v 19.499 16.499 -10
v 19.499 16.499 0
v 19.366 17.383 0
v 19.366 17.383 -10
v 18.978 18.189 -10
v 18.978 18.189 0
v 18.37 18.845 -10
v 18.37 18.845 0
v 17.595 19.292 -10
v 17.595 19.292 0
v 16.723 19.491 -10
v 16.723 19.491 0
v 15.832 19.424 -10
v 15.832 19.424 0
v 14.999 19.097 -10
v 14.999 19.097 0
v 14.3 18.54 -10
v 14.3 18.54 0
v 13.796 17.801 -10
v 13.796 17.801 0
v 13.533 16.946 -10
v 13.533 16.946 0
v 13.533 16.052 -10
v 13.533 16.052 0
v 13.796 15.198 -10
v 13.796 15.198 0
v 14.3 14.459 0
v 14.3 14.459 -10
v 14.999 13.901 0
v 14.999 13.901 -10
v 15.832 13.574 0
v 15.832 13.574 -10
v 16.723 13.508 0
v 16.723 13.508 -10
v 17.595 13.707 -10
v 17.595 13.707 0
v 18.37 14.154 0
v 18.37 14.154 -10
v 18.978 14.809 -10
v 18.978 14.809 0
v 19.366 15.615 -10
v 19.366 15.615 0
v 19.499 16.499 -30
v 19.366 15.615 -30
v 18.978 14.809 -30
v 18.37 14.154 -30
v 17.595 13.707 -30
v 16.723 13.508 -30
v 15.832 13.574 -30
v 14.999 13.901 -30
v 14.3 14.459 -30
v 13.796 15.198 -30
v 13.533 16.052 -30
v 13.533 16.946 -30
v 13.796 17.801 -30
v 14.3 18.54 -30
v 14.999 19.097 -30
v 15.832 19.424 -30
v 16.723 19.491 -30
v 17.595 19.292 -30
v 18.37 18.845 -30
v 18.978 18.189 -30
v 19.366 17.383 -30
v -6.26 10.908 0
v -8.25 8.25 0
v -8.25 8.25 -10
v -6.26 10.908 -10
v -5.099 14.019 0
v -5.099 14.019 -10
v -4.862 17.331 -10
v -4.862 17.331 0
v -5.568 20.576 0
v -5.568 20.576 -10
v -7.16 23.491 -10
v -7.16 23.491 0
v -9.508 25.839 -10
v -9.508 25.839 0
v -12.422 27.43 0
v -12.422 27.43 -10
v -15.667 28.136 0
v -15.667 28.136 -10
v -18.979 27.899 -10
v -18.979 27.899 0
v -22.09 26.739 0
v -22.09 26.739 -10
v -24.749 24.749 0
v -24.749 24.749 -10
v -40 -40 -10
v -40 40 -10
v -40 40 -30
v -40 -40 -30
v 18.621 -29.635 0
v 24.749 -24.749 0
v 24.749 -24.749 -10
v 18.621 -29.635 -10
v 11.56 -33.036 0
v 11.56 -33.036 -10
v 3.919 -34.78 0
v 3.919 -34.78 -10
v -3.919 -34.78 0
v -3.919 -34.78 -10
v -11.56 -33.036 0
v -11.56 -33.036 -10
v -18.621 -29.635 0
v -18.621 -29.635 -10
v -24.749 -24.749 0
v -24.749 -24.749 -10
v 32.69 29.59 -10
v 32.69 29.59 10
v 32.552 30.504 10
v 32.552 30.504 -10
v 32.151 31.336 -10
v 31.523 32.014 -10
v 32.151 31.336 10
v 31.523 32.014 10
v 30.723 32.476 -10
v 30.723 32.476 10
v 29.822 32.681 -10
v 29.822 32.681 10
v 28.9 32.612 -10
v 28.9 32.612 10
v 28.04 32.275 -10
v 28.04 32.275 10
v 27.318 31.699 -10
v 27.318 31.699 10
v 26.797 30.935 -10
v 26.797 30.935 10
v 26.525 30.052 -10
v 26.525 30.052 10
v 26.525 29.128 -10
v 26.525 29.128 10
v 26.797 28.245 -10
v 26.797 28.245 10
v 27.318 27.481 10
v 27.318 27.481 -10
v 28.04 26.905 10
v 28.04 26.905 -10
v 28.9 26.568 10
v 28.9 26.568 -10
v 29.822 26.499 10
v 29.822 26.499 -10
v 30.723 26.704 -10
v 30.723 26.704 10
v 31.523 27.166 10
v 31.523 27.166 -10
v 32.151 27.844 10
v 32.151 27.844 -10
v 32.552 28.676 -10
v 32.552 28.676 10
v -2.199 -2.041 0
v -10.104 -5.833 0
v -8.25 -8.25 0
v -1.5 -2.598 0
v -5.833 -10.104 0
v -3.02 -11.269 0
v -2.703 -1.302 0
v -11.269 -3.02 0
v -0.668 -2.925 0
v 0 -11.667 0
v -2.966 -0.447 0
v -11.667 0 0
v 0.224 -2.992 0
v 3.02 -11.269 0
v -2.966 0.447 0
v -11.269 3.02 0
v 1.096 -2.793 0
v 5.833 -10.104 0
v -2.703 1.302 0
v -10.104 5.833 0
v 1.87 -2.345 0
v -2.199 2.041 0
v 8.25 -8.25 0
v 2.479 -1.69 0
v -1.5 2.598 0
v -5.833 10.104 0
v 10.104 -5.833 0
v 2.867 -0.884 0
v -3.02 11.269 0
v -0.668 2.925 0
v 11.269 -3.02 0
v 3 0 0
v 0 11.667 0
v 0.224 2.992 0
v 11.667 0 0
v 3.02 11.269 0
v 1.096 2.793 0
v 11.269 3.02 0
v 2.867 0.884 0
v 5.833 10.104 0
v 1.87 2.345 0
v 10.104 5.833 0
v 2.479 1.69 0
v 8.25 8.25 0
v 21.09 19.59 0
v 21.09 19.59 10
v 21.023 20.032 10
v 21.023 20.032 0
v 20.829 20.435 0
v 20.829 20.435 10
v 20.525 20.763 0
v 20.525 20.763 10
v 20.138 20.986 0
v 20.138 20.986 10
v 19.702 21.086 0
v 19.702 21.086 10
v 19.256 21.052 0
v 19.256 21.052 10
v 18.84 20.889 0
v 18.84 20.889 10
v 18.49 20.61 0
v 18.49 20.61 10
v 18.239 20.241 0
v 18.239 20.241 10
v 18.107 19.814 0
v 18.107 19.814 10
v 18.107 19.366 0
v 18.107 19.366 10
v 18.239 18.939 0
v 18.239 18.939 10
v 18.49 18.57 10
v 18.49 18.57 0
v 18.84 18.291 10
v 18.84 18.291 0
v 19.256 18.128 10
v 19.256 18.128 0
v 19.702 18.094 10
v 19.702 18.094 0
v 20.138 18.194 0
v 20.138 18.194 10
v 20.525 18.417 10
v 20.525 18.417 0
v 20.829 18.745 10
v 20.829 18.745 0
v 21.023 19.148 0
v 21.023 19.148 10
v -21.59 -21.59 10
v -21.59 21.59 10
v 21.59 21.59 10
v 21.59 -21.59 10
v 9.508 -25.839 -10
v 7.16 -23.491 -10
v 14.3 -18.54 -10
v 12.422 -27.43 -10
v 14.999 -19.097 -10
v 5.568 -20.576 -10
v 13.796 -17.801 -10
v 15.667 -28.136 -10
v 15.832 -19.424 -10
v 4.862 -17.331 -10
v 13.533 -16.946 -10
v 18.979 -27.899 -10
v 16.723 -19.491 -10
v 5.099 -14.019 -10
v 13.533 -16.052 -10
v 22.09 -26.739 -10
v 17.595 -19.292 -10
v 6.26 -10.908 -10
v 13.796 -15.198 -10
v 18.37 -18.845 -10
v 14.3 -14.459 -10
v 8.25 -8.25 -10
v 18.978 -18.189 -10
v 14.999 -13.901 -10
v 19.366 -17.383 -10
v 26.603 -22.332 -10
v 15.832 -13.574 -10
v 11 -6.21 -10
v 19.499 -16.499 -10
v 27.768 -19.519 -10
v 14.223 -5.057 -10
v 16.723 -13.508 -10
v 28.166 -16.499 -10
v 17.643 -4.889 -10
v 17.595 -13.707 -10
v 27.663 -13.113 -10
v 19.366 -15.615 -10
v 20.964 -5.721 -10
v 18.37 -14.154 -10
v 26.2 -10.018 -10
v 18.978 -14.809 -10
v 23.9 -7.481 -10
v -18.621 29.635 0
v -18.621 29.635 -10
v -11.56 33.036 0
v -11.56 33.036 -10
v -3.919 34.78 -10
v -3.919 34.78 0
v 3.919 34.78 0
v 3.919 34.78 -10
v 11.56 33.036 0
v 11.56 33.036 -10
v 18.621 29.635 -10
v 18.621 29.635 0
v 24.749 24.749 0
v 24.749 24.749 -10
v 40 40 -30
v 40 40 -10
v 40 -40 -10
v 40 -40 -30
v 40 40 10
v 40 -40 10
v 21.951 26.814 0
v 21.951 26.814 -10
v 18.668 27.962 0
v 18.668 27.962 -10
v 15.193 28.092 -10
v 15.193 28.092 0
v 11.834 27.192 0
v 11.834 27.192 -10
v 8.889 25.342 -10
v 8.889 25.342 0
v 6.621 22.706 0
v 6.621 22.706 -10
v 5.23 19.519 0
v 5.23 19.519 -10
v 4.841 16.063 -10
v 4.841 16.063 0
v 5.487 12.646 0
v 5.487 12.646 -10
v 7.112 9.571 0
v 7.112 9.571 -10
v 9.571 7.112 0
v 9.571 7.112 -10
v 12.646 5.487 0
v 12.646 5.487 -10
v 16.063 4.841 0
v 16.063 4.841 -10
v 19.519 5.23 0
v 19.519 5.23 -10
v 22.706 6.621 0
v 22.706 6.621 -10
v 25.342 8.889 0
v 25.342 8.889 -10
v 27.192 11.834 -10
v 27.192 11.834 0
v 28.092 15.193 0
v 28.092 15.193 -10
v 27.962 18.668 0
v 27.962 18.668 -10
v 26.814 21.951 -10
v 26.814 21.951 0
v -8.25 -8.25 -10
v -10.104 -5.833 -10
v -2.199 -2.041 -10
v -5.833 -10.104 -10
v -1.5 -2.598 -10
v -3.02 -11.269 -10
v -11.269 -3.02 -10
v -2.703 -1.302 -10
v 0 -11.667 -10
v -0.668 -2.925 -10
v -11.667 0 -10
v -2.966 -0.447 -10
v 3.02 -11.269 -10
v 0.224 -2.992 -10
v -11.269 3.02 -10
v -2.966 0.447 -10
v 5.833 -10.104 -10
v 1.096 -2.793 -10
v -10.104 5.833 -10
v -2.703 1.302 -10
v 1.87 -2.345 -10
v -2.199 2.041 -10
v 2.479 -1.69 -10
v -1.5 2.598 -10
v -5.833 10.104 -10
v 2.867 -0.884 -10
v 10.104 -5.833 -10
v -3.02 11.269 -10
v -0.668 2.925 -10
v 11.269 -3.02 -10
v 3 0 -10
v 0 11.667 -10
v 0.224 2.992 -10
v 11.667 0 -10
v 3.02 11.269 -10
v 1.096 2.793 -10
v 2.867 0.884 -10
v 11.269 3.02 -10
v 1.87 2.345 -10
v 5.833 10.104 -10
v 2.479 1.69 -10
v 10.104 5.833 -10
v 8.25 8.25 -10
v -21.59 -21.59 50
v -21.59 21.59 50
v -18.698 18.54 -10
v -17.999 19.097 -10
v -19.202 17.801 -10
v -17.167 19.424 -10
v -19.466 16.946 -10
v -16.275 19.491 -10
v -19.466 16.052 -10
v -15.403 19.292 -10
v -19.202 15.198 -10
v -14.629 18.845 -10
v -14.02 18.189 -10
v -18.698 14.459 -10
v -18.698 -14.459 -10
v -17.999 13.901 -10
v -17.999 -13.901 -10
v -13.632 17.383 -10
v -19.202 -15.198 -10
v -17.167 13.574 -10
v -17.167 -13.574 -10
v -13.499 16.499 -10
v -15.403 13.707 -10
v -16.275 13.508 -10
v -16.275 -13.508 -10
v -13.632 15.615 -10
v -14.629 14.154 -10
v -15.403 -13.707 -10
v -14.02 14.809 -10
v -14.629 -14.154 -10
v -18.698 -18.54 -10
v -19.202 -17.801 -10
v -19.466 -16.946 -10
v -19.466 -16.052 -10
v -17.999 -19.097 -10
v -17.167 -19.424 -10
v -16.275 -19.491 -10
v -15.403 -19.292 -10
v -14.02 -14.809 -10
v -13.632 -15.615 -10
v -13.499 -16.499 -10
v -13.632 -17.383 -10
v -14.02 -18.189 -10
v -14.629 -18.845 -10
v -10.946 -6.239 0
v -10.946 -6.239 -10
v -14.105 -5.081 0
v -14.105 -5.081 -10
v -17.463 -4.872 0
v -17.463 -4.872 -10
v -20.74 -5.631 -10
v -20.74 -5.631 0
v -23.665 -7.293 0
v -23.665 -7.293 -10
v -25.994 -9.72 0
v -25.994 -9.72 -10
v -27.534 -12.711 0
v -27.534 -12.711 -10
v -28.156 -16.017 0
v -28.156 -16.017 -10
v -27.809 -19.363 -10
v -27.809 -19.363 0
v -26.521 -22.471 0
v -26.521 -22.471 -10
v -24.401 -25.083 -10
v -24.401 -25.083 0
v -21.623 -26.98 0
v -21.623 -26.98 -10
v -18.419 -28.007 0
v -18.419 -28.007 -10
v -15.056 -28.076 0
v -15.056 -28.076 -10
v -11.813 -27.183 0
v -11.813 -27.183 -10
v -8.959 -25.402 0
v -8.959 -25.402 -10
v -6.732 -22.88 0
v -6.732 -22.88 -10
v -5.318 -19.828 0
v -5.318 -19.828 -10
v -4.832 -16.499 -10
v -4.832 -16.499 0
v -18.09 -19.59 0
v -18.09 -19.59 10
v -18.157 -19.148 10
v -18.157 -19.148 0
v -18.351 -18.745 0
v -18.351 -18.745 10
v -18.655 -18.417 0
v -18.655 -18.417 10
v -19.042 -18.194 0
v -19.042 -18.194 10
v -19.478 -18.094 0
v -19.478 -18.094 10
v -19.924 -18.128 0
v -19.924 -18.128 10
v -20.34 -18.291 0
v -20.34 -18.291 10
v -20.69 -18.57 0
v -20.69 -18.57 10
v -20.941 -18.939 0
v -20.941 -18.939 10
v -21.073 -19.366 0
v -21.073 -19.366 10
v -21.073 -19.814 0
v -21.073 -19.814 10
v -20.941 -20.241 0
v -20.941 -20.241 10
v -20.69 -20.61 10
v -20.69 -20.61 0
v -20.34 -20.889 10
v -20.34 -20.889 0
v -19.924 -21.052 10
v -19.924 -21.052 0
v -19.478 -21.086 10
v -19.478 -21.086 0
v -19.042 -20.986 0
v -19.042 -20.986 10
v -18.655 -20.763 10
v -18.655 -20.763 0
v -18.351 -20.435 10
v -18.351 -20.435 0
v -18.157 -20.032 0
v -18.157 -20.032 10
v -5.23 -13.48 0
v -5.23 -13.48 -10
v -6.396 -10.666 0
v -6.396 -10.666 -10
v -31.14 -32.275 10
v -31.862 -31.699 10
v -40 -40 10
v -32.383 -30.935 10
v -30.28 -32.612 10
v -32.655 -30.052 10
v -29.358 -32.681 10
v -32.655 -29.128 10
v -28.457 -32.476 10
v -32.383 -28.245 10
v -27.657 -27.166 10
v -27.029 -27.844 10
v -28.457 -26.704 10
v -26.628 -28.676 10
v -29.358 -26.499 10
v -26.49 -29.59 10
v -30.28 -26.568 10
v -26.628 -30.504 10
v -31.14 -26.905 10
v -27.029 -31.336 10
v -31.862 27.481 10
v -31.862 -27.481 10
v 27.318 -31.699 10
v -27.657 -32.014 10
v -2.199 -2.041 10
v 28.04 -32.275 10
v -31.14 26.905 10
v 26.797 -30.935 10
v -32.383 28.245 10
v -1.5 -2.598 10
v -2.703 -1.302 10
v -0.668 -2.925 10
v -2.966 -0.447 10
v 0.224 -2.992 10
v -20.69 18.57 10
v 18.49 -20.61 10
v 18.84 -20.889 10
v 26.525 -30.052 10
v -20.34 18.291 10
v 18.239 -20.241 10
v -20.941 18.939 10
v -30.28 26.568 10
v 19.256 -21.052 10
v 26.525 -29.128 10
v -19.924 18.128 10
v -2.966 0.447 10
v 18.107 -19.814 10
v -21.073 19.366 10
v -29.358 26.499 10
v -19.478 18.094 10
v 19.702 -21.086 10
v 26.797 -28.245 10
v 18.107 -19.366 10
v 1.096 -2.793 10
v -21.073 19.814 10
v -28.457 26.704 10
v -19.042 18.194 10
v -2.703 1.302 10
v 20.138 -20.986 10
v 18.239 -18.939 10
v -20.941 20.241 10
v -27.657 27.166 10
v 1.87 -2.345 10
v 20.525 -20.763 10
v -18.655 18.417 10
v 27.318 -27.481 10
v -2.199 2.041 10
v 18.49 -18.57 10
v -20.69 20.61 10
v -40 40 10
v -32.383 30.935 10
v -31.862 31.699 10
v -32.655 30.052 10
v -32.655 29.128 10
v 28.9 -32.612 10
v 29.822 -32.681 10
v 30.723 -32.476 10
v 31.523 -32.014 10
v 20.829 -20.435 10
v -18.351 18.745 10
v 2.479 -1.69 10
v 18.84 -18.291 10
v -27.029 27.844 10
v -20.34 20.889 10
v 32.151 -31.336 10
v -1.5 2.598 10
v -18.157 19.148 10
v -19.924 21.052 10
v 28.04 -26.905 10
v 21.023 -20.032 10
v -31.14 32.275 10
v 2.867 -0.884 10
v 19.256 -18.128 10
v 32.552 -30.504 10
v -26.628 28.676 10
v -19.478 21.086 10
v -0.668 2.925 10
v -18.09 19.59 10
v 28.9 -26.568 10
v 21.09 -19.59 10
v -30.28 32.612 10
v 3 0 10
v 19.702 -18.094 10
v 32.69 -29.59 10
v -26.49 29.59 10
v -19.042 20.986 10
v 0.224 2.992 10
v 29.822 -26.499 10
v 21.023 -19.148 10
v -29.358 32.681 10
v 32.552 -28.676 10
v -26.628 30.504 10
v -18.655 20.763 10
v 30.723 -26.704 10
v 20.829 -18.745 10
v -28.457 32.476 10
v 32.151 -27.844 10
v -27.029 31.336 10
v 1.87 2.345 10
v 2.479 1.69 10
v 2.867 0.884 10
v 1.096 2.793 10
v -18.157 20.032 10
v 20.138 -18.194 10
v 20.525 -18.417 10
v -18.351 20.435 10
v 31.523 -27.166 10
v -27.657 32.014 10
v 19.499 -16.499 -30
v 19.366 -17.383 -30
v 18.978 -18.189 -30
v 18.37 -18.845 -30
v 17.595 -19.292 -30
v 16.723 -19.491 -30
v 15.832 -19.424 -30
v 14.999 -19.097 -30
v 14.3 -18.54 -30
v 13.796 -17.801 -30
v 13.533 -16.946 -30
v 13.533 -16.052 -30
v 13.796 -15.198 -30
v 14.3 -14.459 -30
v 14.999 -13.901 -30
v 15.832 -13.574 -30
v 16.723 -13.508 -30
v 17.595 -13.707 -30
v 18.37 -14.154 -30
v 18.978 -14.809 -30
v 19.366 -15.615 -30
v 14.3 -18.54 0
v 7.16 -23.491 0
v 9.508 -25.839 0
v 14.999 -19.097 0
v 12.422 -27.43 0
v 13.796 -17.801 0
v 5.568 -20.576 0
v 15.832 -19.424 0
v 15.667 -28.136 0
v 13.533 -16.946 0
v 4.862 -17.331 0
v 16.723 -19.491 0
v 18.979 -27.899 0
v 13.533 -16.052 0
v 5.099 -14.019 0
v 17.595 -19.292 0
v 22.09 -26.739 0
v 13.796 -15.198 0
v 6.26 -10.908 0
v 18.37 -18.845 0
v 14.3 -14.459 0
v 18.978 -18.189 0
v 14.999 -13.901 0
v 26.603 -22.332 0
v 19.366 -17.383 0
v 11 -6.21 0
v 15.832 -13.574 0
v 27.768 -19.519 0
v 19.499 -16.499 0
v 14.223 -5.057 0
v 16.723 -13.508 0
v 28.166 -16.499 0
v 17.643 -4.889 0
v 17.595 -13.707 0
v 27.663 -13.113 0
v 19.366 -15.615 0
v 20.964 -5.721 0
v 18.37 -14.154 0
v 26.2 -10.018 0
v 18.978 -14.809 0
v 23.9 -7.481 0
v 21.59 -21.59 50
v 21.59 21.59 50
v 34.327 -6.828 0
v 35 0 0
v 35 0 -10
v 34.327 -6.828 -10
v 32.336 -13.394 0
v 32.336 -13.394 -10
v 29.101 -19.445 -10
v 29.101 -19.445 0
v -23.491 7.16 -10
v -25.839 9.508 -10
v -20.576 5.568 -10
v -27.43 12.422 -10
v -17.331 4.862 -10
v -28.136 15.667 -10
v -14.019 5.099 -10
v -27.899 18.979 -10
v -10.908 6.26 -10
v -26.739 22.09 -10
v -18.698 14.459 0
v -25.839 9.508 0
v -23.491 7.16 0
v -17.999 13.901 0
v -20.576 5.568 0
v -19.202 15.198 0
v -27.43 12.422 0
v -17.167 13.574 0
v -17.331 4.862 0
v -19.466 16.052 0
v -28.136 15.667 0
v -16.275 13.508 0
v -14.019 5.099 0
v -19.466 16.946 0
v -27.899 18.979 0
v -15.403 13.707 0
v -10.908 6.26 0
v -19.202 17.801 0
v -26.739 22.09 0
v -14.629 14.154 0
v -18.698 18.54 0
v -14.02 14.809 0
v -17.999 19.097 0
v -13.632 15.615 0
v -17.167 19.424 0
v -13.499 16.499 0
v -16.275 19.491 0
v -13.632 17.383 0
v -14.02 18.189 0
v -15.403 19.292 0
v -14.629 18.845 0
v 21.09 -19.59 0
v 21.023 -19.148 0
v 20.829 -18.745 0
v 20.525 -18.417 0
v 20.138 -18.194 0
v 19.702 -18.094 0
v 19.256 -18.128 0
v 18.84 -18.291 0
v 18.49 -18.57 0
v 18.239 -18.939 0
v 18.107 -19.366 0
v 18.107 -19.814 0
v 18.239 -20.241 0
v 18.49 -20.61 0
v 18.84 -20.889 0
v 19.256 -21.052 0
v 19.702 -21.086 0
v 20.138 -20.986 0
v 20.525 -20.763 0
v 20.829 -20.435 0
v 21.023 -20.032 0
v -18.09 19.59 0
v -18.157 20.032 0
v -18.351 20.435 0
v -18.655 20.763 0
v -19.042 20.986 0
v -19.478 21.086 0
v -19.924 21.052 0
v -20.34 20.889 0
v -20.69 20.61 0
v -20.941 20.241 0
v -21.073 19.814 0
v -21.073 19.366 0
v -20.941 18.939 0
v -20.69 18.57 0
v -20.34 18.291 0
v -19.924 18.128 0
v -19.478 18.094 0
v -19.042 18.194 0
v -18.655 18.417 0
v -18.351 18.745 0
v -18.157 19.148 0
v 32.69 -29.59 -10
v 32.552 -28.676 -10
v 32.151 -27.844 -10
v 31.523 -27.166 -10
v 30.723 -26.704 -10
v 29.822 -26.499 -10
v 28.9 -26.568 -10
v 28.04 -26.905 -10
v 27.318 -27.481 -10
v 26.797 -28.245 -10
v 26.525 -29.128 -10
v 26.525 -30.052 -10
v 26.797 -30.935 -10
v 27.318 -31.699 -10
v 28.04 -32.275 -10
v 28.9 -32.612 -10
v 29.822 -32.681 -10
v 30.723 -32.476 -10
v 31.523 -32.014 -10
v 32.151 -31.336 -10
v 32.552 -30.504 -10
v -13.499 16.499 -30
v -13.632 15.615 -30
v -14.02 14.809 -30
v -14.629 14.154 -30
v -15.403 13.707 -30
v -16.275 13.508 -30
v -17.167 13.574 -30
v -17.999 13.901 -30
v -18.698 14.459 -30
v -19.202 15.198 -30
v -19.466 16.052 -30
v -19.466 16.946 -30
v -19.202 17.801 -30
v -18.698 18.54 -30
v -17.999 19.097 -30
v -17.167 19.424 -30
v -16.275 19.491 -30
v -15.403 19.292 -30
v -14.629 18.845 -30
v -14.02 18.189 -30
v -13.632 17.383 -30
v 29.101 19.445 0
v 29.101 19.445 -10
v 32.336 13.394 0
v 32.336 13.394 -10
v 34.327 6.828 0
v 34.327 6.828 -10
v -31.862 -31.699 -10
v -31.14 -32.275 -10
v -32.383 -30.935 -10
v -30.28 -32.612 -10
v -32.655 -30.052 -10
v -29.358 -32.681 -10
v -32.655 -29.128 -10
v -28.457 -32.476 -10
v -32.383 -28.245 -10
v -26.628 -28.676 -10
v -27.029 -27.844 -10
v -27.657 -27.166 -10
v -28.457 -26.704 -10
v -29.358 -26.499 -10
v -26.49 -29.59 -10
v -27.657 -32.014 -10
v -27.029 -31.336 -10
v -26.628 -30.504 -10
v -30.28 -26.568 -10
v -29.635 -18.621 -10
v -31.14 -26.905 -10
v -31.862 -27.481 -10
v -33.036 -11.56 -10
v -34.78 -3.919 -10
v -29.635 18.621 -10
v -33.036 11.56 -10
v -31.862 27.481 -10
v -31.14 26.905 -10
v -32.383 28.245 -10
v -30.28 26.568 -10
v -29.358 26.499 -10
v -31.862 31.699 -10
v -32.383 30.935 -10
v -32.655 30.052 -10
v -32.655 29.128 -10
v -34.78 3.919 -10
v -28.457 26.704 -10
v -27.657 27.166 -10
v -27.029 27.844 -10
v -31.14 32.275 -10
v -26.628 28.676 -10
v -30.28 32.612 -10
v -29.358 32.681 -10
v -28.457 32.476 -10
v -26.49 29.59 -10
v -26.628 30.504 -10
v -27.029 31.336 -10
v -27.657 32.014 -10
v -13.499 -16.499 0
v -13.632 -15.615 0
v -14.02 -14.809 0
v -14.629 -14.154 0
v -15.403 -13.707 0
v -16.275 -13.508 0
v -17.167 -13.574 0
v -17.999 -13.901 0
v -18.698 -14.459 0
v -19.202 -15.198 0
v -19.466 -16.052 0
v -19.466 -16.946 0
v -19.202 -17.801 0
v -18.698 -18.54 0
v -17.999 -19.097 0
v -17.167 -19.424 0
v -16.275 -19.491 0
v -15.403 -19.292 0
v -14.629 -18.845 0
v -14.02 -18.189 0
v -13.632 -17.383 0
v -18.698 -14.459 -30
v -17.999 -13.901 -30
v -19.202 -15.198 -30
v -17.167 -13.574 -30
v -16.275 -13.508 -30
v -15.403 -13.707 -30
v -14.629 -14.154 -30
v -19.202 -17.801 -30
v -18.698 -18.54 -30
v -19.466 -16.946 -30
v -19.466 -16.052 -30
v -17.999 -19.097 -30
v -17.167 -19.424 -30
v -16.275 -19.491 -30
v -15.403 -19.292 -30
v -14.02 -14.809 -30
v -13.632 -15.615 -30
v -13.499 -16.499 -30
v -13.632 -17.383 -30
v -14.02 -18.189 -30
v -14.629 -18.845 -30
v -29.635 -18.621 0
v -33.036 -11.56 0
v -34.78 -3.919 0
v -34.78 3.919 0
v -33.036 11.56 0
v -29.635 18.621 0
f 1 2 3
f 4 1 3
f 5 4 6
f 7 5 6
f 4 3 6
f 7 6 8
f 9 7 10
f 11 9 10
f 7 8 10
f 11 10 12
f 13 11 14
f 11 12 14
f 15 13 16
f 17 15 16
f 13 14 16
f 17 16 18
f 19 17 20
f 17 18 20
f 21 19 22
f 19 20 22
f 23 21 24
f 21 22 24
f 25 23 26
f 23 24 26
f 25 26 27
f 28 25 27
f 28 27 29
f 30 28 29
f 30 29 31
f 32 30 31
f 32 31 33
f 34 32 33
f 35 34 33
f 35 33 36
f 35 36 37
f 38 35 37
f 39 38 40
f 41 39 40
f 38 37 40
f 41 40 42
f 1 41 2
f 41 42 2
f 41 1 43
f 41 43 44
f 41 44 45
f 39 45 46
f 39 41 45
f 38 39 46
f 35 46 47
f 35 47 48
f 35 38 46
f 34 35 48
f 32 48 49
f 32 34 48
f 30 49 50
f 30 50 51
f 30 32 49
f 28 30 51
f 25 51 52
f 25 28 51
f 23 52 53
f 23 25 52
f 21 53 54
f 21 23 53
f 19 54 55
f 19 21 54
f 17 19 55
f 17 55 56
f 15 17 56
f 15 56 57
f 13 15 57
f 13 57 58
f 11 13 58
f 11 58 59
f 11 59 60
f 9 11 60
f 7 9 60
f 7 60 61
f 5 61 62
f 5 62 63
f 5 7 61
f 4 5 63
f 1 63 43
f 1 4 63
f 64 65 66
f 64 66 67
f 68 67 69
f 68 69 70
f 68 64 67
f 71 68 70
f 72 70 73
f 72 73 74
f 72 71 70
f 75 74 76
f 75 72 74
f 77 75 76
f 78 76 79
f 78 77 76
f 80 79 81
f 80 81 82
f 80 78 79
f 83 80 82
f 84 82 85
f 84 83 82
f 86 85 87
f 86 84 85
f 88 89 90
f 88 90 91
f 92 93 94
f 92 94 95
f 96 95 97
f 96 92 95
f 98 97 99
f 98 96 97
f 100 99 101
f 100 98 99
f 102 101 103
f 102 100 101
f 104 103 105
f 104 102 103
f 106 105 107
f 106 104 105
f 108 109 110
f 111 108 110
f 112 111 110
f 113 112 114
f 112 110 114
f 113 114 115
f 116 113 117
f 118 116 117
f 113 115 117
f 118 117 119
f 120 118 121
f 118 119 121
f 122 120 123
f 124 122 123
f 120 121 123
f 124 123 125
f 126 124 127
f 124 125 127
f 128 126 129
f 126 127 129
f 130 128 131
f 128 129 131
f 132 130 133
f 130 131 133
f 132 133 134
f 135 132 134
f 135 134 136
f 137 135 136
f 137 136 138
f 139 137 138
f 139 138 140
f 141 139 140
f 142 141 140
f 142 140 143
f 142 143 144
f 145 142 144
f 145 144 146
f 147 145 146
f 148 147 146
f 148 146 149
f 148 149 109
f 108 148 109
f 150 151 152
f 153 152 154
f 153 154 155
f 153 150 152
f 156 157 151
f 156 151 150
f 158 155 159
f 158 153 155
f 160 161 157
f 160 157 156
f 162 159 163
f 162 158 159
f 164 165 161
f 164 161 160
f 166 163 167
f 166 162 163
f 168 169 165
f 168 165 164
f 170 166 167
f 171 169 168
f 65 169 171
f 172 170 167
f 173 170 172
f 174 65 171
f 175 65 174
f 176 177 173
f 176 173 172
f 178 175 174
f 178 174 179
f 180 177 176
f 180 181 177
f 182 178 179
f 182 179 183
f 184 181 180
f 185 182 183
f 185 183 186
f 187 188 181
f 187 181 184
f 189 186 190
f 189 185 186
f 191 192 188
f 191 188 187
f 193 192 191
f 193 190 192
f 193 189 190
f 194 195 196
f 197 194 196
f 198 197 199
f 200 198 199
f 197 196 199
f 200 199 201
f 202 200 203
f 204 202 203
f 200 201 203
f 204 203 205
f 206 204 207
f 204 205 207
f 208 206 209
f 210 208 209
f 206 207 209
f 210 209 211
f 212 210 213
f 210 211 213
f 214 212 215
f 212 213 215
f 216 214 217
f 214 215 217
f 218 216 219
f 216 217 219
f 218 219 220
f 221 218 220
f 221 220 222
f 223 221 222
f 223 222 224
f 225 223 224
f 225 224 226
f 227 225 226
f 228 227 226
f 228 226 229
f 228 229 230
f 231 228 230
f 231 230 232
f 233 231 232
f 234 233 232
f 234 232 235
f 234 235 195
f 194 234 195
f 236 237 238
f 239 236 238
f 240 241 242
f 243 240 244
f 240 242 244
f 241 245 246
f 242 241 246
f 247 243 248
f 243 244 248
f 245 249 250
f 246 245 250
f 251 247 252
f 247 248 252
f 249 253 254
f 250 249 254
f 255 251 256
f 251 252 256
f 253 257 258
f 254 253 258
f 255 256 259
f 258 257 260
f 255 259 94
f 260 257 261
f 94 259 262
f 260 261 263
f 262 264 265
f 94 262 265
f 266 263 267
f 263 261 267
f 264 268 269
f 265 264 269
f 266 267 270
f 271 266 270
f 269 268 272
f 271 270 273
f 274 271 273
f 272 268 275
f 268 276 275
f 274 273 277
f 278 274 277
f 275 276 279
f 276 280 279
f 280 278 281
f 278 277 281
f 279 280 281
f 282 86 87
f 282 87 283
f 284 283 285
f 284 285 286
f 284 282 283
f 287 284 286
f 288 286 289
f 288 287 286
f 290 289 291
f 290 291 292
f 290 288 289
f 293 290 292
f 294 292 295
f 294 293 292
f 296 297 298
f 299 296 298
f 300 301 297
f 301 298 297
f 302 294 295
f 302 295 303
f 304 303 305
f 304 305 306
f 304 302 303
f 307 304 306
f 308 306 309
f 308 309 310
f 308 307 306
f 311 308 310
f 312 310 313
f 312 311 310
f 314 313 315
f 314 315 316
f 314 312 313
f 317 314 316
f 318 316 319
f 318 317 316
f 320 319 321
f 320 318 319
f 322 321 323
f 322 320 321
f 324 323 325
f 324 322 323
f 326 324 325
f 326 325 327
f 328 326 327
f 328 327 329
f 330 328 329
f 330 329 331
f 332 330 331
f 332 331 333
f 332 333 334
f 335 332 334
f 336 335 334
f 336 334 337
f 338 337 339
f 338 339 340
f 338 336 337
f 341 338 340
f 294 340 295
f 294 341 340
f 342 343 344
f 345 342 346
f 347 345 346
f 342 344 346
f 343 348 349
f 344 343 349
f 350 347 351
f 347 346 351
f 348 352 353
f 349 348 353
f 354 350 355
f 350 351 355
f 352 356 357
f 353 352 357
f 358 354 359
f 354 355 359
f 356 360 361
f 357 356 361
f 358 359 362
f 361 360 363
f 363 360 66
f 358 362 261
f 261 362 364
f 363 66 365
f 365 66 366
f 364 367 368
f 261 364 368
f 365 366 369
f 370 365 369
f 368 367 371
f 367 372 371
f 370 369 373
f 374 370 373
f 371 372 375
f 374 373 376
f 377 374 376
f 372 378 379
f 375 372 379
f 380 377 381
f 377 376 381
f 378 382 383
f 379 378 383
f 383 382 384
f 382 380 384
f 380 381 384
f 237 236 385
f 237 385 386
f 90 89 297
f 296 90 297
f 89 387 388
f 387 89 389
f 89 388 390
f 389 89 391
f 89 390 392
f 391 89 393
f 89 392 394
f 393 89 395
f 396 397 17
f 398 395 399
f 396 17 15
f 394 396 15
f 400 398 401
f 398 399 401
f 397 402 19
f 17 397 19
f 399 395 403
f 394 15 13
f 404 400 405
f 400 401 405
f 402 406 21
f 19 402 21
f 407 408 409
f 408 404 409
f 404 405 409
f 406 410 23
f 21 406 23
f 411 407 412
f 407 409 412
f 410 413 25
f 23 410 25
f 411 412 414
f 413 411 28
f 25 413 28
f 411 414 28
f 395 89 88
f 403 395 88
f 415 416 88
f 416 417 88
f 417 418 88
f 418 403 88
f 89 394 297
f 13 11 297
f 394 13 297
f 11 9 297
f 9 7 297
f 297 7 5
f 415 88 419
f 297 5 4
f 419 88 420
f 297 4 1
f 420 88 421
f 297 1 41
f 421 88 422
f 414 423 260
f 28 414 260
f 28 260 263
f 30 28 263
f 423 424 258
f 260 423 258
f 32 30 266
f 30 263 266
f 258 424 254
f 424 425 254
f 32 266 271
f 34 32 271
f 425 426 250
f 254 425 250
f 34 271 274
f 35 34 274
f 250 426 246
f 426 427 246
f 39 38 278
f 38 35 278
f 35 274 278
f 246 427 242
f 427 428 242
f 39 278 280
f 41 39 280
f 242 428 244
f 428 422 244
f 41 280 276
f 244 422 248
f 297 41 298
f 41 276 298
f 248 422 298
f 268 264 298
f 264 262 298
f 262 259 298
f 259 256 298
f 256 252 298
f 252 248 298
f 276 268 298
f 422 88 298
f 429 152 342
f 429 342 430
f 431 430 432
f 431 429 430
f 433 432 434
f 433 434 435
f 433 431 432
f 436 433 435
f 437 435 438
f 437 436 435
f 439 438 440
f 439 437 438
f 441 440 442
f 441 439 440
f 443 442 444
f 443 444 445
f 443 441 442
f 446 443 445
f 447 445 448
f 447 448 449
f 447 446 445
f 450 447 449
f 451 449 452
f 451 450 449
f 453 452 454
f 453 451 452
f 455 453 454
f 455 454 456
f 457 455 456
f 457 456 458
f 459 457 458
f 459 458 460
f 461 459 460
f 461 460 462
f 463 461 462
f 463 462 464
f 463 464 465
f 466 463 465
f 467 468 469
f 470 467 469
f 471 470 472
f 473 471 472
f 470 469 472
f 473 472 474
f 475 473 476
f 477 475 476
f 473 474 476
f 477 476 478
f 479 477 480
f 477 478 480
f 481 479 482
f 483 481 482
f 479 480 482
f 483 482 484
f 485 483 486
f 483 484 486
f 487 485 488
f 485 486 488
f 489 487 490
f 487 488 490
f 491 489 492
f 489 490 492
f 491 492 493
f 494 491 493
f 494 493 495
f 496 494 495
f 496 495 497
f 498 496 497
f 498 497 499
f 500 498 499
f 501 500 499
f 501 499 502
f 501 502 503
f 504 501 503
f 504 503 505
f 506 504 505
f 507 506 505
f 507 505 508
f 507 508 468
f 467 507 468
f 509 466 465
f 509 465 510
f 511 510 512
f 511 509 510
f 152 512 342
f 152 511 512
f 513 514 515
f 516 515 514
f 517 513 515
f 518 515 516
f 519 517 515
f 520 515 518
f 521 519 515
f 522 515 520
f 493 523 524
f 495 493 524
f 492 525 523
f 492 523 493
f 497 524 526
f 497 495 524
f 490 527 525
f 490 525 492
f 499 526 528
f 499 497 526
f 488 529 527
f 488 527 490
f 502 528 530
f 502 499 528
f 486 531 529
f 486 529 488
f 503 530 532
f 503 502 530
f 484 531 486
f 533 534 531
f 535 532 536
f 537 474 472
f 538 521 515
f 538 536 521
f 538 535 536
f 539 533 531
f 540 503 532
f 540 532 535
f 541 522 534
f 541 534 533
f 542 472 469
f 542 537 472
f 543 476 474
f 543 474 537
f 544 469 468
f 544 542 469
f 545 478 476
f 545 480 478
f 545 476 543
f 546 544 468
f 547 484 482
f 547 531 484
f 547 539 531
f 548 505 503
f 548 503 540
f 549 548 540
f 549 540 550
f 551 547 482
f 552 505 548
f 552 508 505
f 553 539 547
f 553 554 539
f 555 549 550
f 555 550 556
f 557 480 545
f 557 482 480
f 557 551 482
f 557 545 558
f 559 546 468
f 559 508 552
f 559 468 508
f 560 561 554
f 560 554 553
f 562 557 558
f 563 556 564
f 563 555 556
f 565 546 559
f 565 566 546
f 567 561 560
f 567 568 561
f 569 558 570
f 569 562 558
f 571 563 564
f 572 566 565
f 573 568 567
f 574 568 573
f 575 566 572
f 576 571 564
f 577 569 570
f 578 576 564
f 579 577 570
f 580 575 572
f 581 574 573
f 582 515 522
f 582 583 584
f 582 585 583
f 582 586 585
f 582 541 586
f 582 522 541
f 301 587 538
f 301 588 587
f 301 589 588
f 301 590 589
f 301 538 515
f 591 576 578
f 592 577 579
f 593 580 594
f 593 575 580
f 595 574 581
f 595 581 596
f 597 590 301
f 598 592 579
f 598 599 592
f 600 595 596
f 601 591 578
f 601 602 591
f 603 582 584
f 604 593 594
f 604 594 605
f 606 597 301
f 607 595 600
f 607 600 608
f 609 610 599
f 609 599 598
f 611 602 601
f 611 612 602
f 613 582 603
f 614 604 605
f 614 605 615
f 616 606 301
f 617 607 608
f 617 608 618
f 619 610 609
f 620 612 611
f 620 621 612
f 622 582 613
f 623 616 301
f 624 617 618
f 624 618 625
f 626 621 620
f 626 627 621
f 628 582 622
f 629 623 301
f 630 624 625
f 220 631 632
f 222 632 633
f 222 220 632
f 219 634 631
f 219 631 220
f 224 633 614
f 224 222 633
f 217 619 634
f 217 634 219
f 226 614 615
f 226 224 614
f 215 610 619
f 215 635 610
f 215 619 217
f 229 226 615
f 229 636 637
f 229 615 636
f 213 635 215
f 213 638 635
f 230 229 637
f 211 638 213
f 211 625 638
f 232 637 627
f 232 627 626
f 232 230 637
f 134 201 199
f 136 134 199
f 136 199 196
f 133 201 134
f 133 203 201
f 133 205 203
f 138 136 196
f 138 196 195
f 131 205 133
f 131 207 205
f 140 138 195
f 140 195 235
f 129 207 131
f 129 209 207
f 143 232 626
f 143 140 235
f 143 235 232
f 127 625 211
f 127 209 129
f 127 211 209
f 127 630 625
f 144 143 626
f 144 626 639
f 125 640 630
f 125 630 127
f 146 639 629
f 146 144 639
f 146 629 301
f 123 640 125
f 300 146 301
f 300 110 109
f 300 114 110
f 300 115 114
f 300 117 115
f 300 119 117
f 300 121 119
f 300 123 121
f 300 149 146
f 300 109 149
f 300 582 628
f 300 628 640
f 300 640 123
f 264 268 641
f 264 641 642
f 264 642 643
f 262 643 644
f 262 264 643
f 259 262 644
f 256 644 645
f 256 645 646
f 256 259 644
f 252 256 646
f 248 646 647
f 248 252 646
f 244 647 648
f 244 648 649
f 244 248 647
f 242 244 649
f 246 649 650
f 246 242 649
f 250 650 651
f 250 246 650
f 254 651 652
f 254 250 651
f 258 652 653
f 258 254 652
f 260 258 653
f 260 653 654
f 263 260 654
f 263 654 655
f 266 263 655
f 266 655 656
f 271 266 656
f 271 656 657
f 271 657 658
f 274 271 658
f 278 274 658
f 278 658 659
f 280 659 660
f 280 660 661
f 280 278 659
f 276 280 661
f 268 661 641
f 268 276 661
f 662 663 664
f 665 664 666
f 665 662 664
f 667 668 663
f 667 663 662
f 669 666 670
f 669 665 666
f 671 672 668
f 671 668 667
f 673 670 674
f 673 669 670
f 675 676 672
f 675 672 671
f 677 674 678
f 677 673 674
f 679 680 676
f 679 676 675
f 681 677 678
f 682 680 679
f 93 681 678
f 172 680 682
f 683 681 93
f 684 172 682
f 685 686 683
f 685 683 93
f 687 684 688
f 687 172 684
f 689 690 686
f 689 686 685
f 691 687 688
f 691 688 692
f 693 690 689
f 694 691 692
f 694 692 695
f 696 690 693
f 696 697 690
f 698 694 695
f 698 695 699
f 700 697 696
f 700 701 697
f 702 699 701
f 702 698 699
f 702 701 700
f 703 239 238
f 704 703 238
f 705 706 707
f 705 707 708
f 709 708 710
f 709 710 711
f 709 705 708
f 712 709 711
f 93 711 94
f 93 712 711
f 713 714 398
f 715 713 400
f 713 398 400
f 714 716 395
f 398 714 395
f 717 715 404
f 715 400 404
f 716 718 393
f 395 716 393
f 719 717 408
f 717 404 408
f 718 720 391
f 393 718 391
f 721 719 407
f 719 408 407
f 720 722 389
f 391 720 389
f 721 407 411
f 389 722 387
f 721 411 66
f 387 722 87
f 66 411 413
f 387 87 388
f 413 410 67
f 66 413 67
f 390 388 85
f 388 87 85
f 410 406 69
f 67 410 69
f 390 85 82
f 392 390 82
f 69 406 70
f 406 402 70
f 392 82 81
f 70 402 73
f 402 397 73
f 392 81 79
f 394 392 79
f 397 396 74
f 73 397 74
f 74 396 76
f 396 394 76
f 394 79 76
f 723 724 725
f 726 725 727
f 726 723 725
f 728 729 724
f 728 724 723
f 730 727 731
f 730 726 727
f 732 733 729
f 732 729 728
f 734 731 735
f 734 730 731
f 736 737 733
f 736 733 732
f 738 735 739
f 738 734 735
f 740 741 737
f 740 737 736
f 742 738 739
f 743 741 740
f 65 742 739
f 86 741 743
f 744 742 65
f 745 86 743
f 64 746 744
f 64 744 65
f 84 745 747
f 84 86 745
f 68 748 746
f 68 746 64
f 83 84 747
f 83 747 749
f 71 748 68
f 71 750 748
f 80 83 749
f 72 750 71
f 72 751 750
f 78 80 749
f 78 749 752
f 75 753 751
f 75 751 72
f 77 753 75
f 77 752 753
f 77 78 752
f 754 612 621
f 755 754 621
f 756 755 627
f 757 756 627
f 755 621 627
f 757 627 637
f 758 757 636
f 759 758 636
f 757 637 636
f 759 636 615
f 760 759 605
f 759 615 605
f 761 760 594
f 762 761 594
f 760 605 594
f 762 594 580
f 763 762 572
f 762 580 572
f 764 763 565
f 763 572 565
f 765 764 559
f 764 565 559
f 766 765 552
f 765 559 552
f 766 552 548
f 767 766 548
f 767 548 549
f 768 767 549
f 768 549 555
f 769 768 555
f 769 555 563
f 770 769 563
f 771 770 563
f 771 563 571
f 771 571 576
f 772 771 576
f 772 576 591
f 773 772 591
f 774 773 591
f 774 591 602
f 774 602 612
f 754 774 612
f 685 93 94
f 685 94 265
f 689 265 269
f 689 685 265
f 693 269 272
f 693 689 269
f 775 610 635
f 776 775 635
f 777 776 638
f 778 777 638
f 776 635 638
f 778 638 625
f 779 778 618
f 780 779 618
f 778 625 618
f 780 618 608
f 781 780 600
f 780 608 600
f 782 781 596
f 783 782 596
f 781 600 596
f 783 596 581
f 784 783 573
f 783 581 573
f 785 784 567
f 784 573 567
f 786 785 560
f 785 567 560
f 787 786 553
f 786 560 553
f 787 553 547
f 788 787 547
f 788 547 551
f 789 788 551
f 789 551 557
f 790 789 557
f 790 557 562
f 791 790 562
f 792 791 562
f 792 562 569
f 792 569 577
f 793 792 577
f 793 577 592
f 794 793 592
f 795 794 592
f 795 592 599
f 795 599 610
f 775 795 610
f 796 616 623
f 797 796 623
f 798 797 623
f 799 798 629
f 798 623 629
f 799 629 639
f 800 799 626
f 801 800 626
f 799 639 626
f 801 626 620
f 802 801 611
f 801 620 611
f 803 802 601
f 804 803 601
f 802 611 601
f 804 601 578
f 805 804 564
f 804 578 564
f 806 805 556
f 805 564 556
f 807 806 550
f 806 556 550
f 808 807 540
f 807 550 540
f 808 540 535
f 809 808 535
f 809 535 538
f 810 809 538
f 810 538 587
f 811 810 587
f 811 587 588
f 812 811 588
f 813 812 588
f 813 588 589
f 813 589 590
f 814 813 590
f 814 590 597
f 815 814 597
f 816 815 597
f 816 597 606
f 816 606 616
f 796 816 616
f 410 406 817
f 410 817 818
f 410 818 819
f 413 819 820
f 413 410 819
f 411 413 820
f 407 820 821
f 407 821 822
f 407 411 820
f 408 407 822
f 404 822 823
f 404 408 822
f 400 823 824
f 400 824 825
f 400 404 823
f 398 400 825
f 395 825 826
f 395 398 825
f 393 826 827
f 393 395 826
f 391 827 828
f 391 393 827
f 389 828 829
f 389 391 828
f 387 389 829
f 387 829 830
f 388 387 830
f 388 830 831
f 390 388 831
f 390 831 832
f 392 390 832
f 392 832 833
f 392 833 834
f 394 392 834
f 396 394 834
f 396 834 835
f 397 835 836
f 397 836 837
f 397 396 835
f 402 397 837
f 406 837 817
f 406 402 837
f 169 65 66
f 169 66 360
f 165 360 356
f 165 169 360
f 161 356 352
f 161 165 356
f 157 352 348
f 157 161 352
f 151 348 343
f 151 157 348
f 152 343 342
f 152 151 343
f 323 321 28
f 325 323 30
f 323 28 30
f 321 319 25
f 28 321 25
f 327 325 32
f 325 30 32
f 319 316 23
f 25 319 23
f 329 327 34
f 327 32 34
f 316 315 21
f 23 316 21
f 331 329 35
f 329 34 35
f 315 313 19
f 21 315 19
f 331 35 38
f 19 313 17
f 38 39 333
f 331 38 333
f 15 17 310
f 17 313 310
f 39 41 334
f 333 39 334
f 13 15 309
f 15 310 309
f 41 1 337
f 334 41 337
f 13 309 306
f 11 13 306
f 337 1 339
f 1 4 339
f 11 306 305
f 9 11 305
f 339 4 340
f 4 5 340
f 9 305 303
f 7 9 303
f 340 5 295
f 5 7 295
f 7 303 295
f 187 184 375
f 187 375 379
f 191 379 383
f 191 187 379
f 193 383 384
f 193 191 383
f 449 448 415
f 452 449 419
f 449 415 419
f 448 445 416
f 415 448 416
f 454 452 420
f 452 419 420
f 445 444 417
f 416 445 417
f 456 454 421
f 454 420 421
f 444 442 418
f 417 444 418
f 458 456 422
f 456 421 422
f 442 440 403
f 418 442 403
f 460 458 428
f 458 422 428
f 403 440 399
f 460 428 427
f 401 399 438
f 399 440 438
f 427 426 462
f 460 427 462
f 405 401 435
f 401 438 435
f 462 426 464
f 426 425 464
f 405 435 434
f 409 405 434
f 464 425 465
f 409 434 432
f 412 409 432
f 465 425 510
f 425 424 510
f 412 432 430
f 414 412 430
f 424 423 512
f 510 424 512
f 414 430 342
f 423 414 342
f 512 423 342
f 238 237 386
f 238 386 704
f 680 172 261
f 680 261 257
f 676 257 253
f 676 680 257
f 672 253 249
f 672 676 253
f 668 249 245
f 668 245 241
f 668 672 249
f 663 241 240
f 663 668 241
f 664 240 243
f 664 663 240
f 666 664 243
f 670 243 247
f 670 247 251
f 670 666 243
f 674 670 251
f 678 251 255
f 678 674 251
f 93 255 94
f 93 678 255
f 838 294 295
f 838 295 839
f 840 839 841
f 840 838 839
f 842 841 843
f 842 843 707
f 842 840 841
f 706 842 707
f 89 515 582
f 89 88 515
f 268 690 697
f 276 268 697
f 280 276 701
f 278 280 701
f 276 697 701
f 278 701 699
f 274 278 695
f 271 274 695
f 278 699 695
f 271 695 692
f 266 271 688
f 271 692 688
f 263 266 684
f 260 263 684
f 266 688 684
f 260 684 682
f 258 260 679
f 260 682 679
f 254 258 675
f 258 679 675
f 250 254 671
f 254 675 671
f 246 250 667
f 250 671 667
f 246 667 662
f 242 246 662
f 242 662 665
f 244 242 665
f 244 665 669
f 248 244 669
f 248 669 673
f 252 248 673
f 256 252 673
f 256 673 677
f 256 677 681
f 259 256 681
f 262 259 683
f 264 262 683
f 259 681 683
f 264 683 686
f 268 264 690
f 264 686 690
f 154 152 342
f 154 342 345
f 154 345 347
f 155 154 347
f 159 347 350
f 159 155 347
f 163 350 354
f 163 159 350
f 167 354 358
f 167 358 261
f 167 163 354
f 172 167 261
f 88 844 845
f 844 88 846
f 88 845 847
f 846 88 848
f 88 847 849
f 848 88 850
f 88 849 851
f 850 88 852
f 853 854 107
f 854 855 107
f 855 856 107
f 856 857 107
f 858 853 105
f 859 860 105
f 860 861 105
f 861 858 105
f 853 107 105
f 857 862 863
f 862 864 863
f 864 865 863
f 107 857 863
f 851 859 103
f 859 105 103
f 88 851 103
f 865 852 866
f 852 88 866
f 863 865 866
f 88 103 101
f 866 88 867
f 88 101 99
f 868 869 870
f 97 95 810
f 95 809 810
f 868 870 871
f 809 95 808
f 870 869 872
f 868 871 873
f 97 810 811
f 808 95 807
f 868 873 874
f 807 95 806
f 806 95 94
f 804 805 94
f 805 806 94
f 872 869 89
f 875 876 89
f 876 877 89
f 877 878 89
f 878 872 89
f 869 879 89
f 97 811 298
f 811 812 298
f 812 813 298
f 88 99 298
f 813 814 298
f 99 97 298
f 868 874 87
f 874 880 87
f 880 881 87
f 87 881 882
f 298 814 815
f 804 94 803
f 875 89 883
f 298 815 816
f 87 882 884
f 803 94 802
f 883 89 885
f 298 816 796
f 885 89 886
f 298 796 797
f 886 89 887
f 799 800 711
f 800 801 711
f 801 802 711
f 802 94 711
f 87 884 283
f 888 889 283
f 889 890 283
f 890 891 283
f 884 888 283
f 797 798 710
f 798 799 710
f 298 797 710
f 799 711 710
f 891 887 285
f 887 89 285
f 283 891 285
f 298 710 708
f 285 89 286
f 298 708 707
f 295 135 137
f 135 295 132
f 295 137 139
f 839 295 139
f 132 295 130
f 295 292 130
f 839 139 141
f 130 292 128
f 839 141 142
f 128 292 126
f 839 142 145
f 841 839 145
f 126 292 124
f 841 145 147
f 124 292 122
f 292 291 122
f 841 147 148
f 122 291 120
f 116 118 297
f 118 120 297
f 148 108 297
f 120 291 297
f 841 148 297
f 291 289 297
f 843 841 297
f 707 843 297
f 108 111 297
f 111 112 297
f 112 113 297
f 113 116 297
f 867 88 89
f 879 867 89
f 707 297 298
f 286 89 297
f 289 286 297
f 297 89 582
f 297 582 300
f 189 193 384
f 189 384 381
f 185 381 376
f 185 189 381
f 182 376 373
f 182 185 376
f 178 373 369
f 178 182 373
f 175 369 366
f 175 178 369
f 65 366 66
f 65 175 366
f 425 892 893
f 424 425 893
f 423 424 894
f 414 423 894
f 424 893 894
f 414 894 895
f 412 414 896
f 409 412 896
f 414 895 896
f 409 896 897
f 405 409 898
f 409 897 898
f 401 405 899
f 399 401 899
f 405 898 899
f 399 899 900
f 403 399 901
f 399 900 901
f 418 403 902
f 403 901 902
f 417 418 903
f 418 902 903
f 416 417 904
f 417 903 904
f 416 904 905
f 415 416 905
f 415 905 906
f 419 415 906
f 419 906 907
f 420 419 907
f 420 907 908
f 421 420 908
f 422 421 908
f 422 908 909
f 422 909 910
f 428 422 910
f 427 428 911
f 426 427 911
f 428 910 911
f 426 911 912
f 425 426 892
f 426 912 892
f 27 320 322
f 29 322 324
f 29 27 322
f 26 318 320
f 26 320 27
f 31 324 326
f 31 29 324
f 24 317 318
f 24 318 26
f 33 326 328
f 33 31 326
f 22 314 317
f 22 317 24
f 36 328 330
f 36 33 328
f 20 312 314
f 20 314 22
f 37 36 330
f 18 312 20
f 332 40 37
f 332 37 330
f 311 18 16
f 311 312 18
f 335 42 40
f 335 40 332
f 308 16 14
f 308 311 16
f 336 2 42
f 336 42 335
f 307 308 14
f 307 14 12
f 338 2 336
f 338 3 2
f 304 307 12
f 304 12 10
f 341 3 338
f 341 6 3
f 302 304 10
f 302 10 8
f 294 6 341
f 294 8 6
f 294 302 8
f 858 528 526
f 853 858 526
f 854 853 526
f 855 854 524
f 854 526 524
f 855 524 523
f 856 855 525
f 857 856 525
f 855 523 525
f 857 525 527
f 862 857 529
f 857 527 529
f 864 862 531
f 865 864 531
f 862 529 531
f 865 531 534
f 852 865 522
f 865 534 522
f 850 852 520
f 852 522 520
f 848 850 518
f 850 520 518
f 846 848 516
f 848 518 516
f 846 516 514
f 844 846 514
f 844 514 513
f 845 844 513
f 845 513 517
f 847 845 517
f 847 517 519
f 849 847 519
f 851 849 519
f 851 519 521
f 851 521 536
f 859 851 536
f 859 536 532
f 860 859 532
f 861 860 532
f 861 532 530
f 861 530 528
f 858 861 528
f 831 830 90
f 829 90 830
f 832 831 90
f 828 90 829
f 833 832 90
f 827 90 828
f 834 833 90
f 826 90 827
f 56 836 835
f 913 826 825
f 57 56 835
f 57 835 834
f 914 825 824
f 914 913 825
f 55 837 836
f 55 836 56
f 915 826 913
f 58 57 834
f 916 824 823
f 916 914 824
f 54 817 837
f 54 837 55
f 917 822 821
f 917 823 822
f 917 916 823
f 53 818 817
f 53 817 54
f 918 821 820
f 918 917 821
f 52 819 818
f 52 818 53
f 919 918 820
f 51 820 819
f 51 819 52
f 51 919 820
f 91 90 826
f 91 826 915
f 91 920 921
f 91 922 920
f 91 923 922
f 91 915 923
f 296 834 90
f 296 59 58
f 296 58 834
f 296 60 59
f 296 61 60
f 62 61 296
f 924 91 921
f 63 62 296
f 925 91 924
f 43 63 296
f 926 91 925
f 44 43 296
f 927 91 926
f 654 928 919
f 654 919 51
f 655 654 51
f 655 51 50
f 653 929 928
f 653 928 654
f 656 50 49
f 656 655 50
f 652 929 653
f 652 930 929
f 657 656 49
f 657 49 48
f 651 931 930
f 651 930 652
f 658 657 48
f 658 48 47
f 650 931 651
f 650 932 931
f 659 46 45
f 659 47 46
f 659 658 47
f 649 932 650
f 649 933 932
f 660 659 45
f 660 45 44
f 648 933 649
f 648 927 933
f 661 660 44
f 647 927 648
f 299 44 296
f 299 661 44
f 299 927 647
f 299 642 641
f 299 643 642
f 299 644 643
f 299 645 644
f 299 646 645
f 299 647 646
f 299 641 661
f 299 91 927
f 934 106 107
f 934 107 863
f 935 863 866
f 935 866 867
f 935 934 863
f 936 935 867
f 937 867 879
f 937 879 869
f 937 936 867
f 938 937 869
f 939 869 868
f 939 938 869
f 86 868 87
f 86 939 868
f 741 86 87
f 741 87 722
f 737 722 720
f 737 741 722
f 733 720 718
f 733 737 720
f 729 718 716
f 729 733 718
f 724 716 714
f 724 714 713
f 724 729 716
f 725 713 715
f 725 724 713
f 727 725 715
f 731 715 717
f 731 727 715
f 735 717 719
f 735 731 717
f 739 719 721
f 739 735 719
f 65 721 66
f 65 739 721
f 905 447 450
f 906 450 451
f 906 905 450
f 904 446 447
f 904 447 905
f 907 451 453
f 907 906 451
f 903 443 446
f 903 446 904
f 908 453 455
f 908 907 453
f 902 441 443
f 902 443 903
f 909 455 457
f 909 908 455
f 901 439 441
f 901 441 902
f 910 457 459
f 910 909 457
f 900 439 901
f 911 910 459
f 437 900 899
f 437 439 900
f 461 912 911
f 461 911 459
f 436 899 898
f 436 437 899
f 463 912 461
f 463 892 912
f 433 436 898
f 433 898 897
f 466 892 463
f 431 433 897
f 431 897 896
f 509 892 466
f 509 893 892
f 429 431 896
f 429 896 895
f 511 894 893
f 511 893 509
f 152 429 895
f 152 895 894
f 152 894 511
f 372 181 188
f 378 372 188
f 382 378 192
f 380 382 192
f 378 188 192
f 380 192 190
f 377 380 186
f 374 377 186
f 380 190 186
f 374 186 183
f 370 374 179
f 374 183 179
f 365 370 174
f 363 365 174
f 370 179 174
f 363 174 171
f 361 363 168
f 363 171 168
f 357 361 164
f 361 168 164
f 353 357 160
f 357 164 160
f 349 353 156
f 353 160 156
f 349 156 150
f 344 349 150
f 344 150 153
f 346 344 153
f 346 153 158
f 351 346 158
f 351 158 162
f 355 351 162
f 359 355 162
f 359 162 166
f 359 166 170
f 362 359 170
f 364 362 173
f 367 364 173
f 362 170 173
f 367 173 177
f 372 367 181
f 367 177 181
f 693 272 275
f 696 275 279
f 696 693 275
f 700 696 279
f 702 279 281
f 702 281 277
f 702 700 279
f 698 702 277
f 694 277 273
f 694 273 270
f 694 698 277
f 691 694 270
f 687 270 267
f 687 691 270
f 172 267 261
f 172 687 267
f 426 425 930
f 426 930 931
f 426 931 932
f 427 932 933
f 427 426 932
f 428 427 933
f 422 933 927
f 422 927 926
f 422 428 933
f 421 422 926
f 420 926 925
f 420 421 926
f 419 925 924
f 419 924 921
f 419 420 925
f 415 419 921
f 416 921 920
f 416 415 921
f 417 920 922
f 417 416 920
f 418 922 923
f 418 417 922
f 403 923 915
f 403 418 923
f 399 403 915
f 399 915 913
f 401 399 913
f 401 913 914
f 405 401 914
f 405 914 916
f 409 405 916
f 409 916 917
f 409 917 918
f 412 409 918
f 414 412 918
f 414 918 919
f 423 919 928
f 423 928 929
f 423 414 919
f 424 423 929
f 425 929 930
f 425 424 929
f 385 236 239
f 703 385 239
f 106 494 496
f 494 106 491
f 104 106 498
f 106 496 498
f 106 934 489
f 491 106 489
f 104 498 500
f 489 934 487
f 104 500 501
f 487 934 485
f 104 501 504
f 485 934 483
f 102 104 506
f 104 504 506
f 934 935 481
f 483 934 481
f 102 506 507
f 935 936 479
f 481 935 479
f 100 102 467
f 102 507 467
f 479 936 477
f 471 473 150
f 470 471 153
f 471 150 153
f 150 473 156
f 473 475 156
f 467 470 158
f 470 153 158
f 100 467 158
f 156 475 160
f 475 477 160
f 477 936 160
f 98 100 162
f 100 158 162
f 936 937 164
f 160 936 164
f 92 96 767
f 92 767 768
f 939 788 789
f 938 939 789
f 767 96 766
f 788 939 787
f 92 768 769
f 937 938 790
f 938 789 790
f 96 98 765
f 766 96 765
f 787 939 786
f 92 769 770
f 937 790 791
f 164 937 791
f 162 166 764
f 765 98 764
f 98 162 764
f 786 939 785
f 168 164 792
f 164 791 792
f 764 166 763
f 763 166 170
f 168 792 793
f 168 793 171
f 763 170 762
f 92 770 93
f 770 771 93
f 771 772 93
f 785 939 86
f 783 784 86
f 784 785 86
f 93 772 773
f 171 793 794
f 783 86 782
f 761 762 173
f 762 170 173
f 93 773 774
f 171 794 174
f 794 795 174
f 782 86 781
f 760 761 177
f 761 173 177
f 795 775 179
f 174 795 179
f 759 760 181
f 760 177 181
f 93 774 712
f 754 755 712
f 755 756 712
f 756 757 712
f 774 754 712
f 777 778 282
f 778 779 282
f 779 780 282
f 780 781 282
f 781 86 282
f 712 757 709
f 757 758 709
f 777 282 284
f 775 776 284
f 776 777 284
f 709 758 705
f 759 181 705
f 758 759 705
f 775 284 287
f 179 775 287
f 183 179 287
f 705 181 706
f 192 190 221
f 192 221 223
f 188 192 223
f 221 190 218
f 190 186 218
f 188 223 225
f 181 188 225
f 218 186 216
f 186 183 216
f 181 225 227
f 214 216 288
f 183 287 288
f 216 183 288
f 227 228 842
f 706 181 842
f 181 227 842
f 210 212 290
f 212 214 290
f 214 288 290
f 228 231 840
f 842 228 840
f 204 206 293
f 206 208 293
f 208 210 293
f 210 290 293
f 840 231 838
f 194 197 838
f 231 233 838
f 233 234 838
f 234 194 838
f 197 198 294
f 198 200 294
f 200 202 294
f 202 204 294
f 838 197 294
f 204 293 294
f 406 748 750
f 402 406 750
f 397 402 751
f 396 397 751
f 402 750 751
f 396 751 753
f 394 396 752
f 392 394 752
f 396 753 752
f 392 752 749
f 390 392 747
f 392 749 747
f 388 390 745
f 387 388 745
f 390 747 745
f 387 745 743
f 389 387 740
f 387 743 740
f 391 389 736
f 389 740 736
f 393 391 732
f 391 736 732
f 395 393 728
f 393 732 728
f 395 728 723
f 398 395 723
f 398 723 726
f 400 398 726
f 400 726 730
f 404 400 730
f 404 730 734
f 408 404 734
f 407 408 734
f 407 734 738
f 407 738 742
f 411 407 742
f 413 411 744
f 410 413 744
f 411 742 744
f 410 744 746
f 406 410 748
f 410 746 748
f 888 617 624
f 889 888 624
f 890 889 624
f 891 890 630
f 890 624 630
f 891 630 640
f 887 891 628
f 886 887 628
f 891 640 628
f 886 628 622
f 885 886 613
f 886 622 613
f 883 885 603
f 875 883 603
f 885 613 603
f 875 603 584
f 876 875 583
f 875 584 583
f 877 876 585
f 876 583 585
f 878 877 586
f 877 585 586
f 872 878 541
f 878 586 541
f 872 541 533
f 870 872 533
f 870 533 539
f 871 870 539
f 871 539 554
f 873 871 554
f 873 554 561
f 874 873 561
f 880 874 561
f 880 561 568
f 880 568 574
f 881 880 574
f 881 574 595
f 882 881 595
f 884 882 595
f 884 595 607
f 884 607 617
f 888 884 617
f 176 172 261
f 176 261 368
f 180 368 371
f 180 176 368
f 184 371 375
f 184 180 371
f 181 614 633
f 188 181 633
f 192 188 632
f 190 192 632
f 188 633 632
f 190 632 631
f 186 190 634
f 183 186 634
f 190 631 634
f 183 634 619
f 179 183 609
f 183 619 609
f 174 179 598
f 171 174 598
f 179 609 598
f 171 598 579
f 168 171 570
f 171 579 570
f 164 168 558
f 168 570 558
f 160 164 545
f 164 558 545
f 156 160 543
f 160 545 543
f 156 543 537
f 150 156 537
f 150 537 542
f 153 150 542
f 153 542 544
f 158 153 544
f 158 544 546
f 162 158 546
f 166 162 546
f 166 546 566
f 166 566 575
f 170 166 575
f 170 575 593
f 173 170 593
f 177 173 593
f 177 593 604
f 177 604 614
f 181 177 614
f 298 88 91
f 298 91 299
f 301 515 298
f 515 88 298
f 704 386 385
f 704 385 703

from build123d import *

# Parameters (mm, degrees)
F0_W     = 80
F0_H     = 80
F1_DEPTH = 10
F0_R     = 3
F2_W     = 80
F2_H     = 80
F2_R     = 3
F3_DEPTH = 20
F4_W     = 80
F4_H     = 80
F5_DEPTH = 10
F6_W     = 43.18
F6_H     = 43.18
F6_R     = 1.5
F6_R_2   = 3
F7_DEPTH = 40
F6_R_3   = 3.1
F8_DEPTH = 25


with BuildPart() as f1:
    # F0 (on Top) → F1 (new body)
    with BuildSketch(Plane.XY):
        Rectangle(F0_W, F0_H)
        with BuildLine():
            ThreePointArc((-24.7487373417, -24.7487373413), (-35, 1.228e-07), (-24.7487371681, 24.748737515))
            ThreePointArc((-24.7487371681, 24.748737515), (1.227e-07, 35), (24.7487373415, 24.7487373415))
            ThreePointArc((24.7487373415, 24.7487373415), (32.3357836379, 13.3939201328), (35, 0))
            ThreePointArc((35, 0), (32.3357836202, -13.3939201755), (24.7487372761, -24.7487374069))
            ThreePointArc((24.7487372761, -24.7487374069), (-4.64e-08, -35), (-24.7487373417, -24.7487373413))
        make_face(mode=Mode.SUBTRACT)
    extrude(amount=-F1_DEPTH)

    # F4 (on face) → F5 (join)
    with BuildSketch(Plane.XY):
        Rectangle(F4_W, F4_H)
    extrude(amount=F5_DEPTH)

    # F6 (on face) → F8 (cut)
    with BuildSketch(Plane.XY.offset(10)):
        with Locations((19.59, -19.59)):
            Circle(F6_R)
        with Locations((-19.59, -19.59)):
            Circle(F6_R)
        with Locations((-19.59, 19.59)):
            Circle(F6_R)
        with Locations((19.59, 19.59)):
            Circle(F6_R)
        Circle(F6_R_2)
        with Locations((-29.59, -29.59)):
            Circle(F6_R_3)
        with Locations((29.59, -29.59)):
            Circle(F6_R_3)
        with Locations((-29.59, 29.59)):
            Circle(F6_R_3)
        with Locations((29.59, 29.59)):
            Circle(F6_R_3)
    extrude(amount=-F8_DEPTH, mode=Mode.SUBTRACT)


with BuildPart() as f1b:
    # F0 (on Top) → F1, piece 2 (new body)
    with BuildSketch(Plane.XY):
        with BuildLine():
            ThreePointArc((-8.2495791516, 8.2495790761), (-5.7205636919, 12.0345181588), (-4.832491561, 16.4991582277))
            ThreePointArc((-4.832491561, 16.4991582277), (-12.0345180701, 27.2777527267), (-24.7487371681, 24.748737515))
            ThreePointArc((-24.7487371681, 24.748737515), (-24.7487374471, 8.2495792195), (-8.2495791516, 8.2495790761))
        make_face()
        with Locations((-16.4991582277, 16.4991582277)):
            Circle(F0_R, mode=Mode.SUBTRACT)
    extrude(amount=-F1_DEPTH)


with BuildPart() as f1c:
    # F0 (on Top) → F1, piece 3 (new body)
    with BuildSketch(Plane.XY):
        with BuildLine():
            ThreePointArc((28.1658248944, 16.4991582277), (27.2777527737, 20.9637982719), (24.7487373415, 24.7487373415))
            ThreePointArc((24.7487373415, 24.7487373415), (8.24957912, 24.7487373477), (8.2495791015, 8.2495791262))
            ThreePointArc((8.2495791015, 8.2495791262), (20.9637982639, 5.7205636784), (28.1658248944, 16.4991582277))
        make_face()
        with Locations((16.4991582277, 16.4991582277)):
            Circle(F0_R, mode=Mode.SUBTRACT)
    extrude(amount=-F1_DEPTH)


with BuildPart() as f1d:
    # F0 (on Top) → F1, piece 4 (new body)
    with BuildSketch(Plane.XY):
        with BuildLine():
            ThreePointArc((-8.2495791138, -8.2495791138), (-24.7487373414, -8.2495791137), (-24.7487373417, -24.7487373413))
            ThreePointArc((-24.7487373417, -24.7487373413), (-12.0345181836, -27.2777527737), (-4.832491561, -16.4991582277))
            ThreePointArc((-4.832491561, -16.4991582277), (-5.7205636817, -12.0345181834), (-8.2495791138, -8.2495791138))
        make_face()
        with Locations((-16.4991582277, -16.4991582277)):
            Circle(F0_R, mode=Mode.SUBTRACT)
    extrude(amount=-F1_DEPTH)


with BuildPart() as f1e:
    # F0 (on Top) → F1, piece 5 (new body)
    with BuildSketch(Plane.XY):
        with BuildLine():
            ThreePointArc((8.2495791392, -8.2495790884), (8.2495790684, -24.7487372961), (24.7487372761, -24.7487374069))
            ThreePointArc((24.7487372761, -24.7487374069), (27.277752756, -20.9637983147), (28.1658248944, -16.4991582277))
            ThreePointArc((28.1658248944, -16.4991582277), (20.9637982885, -5.7205636886), (8.2495791392, -8.2495790884))
        make_face()
        with Locations((16.4991582277, -16.4991582277)):
            Circle(F0_R, mode=Mode.SUBTRACT)
    extrude(amount=-F1_DEPTH)


with BuildPart() as f1f:
    # F0 (on Top) → F1, piece 6 (new body)
    with BuildSketch(Plane.XY):
        with BuildLine():
            ThreePointArc((8.2495791015, 8.2495791262), (-3.54e-08, 11.6666666667), (-8.2495791516, 8.2495790761))
            ThreePointArc((-8.2495791516, 8.2495790761), (-11.6666666667, -2.67e-08), (-8.2495791138, -8.2495791138))
            ThreePointArc((-8.2495791138, -8.2495791138), (1.8e-08, -11.6666666667), (8.2495791392, -8.2495790884))
            ThreePointArc((8.2495791392, -8.2495790884), (10.7785945528, -4.4646400277), (11.6666666667, 0))
            ThreePointArc((11.6666666667, 0), (10.7785945426, 4.4646400523), (8.2495791015, 8.2495791262))
        make_face()
        Circle(F0_R, mode=Mode.SUBTRACT)
    extrude(amount=-F1_DEPTH)


with BuildPart() as f3:
    # F2 (on face) → F3 (new body)
    with BuildSketch(Plane(origin=(0, 0, -10), x_dir=(1, 0, 0), z_dir=(0, 0, -1))):
        Rectangle(F2_W, F2_H)
        with Locations((-16.4991582277, -16.4991582277)):
            Circle(F2_R, mode=Mode.SUBTRACT)
        with Locations((16.4991582277, -16.4991582277)):
            Circle(F2_R, mode=Mode.SUBTRACT)
        with Locations((-16.4991582277, 16.4991582277)):
            Circle(F2_R, mode=Mode.SUBTRACT)
        with Locations((16.4991582277, 16.4991582277)):
            Circle(F2_R, mode=Mode.SUBTRACT)
    extrude(amount=F3_DEPTH)


with BuildPart() as f7:
    # F6 (on face) → F7 (new body)
    with BuildSketch(Plane.XY.offset(10)):
        Rectangle(F6_W, F6_H)
        with Locations((-19.59, -19.59)):
            Circle(F6_R, mode=Mode.SUBTRACT)
        with Locations((19.59, -19.59)):
            Circle(F6_R, mode=Mode.SUBTRACT)
        with Locations((-19.59, 19.59)):
            Circle(F6_R, mode=Mode.SUBTRACT)
        Circle(F6_R_2, mode=Mode.SUBTRACT)
        with Locations((19.59, 19.59)):
            Circle(F6_R, mode=Mode.SUBTRACT)
        Circle(F6_R_2)
        with Locations((19.59, -19.59)):
            Circle(F6_R)
        with Locations((-19.59, -19.59)):
            Circle(F6_R)
        with Locations((-19.59, 19.59)):
            Circle(F6_R)
        with Locations((19.59, 19.59)):
            Circle(F6_R)
    extrude(amount=F7_DEPTH)


solid = Compound([f1.part, f1b.part, f1c.part, f1d.part, f1e.part, f1f.part, f3.part, f7.part])
